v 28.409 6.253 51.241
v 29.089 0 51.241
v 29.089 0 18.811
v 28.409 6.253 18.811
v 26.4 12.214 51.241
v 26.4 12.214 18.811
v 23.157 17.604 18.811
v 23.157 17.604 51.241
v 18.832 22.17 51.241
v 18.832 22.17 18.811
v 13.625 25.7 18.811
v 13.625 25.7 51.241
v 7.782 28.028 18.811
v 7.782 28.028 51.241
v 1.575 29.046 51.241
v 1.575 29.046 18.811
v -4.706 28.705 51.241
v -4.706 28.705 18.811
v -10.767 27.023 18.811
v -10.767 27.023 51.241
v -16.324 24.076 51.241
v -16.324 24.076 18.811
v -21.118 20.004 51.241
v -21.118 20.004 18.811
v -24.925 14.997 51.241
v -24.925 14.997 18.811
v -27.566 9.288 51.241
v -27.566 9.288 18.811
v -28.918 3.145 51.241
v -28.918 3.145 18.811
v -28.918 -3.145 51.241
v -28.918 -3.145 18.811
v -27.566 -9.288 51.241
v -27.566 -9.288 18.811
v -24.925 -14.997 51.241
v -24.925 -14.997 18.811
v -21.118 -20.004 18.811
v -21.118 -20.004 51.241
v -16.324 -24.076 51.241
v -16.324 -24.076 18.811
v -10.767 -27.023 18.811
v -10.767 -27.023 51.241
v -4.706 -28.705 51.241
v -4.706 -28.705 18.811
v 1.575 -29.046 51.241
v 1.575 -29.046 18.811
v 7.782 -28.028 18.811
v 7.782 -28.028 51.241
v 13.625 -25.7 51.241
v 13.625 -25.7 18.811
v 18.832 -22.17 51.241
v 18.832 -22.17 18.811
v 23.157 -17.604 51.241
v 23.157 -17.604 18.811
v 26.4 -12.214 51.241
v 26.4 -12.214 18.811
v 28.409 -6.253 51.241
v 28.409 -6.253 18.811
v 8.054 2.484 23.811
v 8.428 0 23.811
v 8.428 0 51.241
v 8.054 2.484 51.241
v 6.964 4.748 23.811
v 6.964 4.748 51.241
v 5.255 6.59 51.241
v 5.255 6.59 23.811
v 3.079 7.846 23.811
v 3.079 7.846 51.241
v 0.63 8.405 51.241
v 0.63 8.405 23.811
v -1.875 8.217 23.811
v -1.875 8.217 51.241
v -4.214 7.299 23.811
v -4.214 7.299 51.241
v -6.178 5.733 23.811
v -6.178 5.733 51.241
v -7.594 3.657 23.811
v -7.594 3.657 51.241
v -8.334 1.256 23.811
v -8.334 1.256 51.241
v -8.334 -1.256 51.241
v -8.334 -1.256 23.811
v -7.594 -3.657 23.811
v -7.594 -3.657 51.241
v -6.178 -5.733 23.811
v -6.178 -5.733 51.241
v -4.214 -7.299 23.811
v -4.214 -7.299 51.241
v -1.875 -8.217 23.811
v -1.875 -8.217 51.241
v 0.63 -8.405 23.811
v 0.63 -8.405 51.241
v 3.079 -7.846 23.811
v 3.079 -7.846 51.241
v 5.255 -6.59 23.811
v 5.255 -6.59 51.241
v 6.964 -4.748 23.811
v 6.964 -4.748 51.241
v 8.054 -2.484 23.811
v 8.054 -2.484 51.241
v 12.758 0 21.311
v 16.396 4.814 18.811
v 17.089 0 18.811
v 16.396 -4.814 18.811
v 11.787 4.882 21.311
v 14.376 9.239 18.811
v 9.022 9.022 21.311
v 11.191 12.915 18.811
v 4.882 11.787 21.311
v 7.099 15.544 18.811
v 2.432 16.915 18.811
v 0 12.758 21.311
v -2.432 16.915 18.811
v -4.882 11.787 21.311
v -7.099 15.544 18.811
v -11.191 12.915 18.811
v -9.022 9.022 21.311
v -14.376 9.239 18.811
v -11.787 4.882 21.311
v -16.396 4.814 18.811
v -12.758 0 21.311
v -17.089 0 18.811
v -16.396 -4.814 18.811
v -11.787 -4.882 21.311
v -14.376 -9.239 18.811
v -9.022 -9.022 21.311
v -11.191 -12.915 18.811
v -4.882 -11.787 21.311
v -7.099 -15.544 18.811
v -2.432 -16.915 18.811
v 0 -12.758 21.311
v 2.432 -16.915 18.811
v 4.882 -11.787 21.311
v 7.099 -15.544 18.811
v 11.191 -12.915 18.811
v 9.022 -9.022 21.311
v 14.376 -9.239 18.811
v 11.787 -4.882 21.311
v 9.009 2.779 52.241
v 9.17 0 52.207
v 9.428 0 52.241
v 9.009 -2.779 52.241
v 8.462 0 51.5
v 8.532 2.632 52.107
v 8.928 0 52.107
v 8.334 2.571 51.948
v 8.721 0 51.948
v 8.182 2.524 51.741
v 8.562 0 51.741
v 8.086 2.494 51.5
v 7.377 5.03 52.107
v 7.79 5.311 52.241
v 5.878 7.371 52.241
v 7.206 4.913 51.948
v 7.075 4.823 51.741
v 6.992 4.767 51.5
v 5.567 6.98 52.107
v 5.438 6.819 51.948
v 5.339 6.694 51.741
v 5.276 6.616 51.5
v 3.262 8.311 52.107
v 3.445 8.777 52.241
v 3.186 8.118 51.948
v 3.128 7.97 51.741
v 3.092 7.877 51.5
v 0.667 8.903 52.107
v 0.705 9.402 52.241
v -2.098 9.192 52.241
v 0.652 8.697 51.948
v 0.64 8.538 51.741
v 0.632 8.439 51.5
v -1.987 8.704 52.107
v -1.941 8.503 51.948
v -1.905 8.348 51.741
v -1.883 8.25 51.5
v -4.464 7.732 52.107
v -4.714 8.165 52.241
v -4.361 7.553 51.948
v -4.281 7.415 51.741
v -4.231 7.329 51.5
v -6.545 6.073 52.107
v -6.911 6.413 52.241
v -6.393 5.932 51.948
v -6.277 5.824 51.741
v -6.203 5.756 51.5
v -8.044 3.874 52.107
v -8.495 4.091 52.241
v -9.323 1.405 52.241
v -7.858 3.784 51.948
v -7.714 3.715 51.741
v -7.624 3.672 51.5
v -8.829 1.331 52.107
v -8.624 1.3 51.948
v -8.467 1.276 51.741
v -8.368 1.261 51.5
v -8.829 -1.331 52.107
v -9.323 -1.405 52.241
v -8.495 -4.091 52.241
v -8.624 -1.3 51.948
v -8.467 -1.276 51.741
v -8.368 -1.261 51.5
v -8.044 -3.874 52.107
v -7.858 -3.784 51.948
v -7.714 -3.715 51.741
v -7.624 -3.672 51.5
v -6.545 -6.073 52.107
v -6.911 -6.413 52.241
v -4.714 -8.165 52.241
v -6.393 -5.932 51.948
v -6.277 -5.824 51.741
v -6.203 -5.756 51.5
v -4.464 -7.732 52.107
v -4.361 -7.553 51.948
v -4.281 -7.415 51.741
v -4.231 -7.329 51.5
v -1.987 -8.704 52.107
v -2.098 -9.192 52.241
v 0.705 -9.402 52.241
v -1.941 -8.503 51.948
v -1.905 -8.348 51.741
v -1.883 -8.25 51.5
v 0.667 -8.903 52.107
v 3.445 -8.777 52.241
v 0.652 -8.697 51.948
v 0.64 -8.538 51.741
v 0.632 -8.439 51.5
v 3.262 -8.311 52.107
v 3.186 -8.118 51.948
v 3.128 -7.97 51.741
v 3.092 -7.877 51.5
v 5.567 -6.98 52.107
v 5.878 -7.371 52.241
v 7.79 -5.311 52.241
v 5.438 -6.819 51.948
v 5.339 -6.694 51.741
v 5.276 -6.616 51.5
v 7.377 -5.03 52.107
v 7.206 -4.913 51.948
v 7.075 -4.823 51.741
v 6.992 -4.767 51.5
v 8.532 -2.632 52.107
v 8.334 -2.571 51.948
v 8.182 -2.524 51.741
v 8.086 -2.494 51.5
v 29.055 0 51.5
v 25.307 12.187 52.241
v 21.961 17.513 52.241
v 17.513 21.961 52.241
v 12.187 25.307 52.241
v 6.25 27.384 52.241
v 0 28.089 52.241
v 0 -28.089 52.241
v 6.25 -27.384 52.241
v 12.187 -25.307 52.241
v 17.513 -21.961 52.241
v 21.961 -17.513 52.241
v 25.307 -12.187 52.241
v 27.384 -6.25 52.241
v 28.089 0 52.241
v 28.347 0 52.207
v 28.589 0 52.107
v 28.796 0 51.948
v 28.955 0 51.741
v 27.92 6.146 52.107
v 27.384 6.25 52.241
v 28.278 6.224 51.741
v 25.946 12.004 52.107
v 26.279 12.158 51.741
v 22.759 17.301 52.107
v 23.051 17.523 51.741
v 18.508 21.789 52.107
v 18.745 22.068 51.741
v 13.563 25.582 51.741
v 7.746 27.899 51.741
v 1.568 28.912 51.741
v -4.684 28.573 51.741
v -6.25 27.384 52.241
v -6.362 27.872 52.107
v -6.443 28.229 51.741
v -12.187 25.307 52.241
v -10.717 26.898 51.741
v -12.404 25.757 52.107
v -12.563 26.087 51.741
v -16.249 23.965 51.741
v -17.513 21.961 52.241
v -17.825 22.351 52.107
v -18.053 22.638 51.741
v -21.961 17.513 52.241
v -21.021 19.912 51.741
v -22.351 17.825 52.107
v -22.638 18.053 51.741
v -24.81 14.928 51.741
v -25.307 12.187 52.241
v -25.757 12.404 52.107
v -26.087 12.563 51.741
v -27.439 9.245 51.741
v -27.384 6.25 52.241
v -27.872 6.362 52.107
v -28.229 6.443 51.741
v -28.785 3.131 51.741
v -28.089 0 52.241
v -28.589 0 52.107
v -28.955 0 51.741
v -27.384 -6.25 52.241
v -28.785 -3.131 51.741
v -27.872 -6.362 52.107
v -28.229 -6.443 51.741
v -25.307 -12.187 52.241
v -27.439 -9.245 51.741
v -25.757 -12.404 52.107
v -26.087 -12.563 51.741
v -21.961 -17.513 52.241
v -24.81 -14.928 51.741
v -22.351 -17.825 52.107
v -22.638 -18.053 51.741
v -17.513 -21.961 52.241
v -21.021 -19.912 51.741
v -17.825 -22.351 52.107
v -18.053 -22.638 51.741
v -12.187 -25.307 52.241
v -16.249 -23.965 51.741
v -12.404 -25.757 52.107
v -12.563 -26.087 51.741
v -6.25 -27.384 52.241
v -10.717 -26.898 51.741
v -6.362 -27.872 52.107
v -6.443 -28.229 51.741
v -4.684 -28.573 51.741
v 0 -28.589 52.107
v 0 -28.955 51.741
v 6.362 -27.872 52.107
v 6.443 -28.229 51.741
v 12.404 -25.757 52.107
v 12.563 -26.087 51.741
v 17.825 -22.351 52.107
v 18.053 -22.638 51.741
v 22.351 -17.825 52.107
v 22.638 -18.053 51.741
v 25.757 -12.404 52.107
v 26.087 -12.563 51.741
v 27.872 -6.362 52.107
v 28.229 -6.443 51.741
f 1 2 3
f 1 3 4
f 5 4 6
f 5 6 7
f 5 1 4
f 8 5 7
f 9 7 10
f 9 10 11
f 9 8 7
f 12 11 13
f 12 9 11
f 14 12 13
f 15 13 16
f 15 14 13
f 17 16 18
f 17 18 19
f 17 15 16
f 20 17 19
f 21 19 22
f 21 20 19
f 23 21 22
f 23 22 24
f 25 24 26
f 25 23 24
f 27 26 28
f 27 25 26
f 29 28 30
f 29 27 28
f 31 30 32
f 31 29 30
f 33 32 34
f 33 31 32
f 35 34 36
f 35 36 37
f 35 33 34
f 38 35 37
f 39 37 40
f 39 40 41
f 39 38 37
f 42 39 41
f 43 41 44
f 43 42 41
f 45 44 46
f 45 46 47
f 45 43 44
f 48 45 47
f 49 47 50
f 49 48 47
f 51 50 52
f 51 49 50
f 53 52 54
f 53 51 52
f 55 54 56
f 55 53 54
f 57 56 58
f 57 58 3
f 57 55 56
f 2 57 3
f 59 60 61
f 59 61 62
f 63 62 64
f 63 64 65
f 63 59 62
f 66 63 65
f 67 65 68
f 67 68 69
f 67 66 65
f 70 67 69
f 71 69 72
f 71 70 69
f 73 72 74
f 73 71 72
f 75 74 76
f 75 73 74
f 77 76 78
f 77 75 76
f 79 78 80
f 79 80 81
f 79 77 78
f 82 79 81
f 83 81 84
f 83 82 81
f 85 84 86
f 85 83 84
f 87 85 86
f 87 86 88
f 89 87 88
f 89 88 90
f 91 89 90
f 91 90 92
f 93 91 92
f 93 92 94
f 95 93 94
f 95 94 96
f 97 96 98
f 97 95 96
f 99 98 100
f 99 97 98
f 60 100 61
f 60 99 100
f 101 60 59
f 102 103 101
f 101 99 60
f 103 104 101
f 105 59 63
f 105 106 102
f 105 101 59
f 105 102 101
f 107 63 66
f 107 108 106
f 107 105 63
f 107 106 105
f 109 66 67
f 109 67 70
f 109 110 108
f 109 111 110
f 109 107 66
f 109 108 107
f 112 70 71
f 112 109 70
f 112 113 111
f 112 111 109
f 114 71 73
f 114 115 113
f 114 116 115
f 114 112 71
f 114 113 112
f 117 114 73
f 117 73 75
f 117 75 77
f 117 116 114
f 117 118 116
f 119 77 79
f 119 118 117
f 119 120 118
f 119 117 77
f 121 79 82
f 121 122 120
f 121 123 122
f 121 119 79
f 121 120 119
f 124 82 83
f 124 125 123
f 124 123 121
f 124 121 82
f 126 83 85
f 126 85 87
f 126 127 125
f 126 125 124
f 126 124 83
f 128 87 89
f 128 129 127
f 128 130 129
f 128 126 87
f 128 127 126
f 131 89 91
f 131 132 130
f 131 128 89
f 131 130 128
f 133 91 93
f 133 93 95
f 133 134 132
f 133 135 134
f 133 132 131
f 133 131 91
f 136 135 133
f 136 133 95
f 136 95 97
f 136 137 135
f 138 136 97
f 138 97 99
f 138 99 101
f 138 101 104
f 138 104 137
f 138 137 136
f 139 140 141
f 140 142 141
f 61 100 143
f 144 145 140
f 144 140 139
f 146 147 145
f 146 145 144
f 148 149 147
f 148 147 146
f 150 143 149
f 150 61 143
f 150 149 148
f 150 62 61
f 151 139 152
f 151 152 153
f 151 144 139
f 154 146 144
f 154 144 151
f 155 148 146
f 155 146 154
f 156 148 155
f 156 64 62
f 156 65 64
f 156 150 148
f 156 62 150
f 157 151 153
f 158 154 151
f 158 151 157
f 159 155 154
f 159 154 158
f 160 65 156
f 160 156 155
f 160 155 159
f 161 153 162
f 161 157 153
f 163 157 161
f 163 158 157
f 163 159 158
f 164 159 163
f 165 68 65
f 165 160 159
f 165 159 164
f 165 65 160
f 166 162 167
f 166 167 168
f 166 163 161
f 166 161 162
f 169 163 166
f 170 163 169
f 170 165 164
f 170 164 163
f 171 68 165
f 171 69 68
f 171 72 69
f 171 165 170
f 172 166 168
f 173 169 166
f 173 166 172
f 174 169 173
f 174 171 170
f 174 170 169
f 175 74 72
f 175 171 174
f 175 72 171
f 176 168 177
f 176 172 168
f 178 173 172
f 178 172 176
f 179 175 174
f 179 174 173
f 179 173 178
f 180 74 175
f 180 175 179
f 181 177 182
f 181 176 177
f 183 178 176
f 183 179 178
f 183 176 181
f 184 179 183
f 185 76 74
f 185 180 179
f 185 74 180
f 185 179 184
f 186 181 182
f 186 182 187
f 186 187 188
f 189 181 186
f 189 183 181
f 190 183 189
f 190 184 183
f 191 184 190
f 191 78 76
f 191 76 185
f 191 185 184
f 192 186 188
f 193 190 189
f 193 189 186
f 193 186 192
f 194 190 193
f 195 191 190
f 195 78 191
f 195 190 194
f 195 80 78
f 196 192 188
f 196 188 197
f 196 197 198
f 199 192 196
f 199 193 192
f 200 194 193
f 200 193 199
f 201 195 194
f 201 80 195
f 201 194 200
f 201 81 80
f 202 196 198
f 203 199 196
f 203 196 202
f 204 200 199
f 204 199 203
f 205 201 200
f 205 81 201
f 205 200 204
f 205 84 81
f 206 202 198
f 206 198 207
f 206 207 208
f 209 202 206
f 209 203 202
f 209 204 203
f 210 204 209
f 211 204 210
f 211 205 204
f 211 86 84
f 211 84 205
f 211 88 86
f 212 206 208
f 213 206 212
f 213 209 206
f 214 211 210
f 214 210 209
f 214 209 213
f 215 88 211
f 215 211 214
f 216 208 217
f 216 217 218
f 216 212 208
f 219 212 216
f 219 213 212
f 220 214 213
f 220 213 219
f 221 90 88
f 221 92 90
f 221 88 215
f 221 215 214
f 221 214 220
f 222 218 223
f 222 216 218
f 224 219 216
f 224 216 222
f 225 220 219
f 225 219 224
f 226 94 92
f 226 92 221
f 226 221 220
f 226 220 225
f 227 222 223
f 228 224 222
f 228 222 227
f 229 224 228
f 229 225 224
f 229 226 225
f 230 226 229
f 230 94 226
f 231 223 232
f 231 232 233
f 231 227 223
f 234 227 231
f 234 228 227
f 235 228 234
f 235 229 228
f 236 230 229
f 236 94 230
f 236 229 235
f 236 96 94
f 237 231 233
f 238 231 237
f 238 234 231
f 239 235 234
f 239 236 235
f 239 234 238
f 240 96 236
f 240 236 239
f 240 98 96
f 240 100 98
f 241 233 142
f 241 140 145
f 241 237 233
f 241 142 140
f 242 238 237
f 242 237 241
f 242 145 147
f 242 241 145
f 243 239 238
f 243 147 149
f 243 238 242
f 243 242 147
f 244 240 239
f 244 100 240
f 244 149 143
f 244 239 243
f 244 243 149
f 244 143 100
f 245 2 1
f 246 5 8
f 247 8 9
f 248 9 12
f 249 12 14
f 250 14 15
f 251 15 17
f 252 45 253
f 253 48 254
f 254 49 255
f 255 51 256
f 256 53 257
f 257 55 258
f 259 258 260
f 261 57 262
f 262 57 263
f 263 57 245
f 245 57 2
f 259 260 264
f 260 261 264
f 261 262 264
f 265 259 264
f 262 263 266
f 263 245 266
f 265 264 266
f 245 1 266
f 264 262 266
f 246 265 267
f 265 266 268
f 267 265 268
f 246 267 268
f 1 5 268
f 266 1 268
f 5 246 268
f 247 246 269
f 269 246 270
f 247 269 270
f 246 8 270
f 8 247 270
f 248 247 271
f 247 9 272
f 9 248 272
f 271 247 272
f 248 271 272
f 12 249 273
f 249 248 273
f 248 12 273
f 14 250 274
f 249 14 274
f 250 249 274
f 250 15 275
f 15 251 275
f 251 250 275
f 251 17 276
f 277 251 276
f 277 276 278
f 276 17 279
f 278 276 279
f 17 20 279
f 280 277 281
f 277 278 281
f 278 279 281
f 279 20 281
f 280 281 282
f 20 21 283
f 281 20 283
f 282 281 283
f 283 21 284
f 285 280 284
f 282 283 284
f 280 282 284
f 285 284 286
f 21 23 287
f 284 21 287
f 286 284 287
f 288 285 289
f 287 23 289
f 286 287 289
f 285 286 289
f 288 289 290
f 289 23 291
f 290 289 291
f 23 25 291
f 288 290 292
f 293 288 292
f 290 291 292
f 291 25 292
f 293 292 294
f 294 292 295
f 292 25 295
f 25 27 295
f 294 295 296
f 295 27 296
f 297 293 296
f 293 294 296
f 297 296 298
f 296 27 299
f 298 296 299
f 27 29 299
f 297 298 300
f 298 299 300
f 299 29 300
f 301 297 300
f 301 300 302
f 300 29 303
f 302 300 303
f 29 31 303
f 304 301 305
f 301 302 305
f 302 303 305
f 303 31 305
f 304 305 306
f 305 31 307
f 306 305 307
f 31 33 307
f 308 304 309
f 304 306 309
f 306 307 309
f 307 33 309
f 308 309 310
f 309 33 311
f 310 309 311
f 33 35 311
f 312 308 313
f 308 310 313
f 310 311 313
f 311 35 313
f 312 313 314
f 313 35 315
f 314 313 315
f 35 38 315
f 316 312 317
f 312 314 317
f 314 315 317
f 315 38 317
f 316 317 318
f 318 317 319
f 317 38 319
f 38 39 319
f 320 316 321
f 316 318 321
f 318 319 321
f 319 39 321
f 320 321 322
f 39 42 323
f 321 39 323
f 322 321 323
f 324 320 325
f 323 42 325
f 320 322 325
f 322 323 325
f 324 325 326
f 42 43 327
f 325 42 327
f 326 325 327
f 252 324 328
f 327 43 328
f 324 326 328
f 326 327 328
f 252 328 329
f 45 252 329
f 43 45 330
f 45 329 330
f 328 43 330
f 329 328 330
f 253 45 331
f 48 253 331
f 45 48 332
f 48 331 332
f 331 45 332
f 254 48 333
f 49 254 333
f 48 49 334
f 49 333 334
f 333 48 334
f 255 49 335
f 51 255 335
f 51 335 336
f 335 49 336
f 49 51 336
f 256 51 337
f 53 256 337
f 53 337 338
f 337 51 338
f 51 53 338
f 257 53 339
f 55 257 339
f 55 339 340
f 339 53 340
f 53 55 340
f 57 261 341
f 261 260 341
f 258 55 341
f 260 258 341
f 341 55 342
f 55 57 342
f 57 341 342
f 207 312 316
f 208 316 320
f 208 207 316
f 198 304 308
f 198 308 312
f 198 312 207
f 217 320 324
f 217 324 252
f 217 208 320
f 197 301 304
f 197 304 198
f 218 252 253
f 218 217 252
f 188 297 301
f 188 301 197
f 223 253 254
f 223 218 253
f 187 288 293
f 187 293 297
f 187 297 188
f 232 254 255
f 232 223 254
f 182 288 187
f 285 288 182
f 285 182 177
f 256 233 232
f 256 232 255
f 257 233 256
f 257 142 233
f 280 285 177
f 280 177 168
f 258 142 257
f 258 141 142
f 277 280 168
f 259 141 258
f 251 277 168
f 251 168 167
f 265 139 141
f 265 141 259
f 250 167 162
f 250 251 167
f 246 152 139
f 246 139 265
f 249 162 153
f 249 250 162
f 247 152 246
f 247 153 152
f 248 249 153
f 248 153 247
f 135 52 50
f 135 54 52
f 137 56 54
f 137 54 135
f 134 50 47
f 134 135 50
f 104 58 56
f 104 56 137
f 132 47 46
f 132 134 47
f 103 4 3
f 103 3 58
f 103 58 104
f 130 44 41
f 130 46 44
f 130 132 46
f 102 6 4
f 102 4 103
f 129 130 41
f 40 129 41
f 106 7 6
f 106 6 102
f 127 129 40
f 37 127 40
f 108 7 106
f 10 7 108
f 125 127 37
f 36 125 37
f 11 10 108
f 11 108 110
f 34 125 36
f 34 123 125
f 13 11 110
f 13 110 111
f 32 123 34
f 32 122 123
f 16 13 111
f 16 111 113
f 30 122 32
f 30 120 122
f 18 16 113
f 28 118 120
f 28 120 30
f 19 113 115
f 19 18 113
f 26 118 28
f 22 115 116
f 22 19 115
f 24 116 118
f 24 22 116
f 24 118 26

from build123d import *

# Parameters (mm, degrees)
F2_R = 1


with BuildPart() as f1:
    # F0 (on Front) → F1 (revolve)
    with BuildSketch(Plane.XZ):
        Polygon((29.0886, 52.241075), (8.428346, 52.241075), (8.428346, 23.81056), (17.0886, 18.81056), (29.0886, 18.81056), align=None)
    revolve(axis=Axis((0, 0, 34.322324), (0, 0, 1)))

    # F2
    f2_edges = [f1.edges().sort_by_distance(p)[0] for p in [
        (-29.0886, 0, 52.241075),
        (-8.428346, 0, 52.241075),
    ]]
    fillet(f2_edges, radius=F2_R)


solid = f1.part
